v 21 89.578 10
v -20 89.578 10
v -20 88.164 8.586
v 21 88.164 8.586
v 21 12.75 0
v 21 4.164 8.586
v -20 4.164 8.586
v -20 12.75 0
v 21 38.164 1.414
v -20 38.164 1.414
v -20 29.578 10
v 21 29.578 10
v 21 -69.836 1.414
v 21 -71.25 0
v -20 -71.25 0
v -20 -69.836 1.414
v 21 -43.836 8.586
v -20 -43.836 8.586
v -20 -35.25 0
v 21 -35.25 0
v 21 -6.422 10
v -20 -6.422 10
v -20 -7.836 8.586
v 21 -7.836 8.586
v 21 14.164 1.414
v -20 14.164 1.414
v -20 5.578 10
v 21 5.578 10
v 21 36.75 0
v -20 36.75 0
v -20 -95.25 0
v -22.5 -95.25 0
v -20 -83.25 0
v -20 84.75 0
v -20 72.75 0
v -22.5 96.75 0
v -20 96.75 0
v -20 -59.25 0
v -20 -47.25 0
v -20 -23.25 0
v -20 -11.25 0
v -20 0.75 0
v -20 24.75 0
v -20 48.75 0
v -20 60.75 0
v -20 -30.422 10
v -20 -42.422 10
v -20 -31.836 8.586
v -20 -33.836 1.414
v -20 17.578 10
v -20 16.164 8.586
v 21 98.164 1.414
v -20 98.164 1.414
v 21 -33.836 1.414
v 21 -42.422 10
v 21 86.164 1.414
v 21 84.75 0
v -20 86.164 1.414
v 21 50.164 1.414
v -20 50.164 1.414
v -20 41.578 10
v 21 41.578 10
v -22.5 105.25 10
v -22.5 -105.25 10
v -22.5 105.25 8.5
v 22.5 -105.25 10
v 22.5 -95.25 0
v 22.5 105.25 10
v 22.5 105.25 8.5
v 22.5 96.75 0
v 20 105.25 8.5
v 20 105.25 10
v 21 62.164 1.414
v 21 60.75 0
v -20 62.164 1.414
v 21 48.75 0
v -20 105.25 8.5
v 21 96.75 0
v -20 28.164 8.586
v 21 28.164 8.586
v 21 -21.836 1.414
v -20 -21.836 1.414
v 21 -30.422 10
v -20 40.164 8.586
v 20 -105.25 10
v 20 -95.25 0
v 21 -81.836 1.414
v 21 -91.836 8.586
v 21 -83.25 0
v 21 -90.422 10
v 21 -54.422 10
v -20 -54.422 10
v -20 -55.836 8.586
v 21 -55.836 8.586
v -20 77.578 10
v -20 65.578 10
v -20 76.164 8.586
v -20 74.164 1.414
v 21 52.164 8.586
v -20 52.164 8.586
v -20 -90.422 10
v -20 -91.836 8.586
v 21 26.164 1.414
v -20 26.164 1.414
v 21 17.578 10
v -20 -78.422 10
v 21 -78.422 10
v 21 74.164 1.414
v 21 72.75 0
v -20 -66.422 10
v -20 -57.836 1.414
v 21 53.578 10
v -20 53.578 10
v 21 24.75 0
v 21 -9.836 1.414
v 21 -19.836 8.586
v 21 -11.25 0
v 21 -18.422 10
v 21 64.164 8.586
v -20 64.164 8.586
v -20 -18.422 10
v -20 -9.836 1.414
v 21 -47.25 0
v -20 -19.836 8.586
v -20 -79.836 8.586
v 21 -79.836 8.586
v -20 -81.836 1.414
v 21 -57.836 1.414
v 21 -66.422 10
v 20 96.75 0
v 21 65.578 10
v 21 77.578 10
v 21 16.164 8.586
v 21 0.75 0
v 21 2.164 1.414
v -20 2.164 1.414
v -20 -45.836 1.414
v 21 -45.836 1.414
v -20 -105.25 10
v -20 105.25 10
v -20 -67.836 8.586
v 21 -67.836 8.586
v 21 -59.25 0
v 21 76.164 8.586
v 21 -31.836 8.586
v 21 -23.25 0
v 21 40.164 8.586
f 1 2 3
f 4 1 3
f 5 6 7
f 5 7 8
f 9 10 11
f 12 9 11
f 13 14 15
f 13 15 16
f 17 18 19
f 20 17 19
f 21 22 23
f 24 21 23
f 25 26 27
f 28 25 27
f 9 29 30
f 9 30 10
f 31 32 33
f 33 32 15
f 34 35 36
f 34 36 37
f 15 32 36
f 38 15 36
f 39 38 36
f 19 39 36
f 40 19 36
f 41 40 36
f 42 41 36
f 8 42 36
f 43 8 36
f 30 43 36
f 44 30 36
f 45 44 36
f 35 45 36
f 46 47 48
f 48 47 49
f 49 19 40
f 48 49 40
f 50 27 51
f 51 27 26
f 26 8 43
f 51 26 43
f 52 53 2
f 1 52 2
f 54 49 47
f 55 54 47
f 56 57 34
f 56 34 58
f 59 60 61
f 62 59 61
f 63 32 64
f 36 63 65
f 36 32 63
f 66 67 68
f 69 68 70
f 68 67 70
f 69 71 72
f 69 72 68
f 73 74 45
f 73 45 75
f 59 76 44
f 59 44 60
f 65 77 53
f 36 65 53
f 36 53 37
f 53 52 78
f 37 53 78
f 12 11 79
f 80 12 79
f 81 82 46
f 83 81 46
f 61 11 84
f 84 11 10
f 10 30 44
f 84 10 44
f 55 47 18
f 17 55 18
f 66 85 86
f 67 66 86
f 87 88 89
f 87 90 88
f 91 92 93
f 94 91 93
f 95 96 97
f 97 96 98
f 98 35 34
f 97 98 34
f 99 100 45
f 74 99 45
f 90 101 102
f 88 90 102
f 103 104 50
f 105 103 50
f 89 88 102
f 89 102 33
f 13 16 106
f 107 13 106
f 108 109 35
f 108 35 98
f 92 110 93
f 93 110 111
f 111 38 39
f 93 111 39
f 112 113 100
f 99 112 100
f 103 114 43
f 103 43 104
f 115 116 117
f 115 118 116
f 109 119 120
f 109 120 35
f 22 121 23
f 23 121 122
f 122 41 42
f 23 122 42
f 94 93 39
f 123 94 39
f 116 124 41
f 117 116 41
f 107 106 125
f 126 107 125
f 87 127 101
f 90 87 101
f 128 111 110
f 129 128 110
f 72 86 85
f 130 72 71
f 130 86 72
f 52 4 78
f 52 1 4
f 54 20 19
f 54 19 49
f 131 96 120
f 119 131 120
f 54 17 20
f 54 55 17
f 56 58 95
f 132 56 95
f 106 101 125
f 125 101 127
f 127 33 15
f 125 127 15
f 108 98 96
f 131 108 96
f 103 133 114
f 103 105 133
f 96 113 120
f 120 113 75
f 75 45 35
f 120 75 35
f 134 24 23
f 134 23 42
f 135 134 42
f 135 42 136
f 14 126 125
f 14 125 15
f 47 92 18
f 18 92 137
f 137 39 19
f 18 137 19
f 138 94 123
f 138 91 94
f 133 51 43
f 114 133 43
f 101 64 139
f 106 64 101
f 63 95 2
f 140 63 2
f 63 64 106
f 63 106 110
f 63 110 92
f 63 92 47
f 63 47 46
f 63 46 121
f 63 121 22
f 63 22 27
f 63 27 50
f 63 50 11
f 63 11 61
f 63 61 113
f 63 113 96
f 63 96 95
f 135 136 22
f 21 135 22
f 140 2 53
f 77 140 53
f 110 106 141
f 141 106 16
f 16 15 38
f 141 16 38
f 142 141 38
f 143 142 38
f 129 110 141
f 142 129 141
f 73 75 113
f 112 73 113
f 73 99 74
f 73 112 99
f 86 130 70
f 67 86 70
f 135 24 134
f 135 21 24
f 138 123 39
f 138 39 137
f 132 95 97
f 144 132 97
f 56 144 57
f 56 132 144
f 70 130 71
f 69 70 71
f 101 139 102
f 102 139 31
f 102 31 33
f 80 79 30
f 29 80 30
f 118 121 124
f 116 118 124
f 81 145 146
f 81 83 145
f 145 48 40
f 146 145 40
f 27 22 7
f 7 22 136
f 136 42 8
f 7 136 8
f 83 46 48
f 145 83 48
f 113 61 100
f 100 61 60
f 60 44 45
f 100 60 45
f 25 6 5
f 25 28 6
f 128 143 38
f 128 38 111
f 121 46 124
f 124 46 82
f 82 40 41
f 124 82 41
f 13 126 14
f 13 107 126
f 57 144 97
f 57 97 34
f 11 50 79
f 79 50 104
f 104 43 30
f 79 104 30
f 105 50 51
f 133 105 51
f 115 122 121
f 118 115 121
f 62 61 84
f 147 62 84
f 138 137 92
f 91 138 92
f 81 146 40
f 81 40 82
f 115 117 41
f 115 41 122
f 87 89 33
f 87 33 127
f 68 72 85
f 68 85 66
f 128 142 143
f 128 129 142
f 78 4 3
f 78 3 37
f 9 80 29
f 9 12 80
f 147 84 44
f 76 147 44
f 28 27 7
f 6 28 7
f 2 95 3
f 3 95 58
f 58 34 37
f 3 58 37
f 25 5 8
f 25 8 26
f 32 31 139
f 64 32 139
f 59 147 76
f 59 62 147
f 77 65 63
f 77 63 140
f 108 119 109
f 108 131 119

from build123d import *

# Parameters (mm, degrees)
F0_W     = 2.5
F0_H     = 210.5
F1_DEPTH = 10
F3_DEPTH = 41
F4_DEPTH = 3
F6_DEPTH = 4


with BuildPart() as f1:
    # F0 (on Top) → F1 (new body)
    with BuildSketch(Plane.XY):
        with Locations((-21.25, 0)):
            Rectangle(F0_W, F0_H)
    extrude(amount=F1_DEPTH)

    # F2 (on face) → F3 (join)
    with BuildSketch(Plane.YZ.offset(-20)):
        Polygon((-91.8357864376, 8.5857864376), (-83.25, 0), (-81.8357864376, 1.4142135624), (-90.4215728753, 10), align=None)
        Polygon((-79.8357864376, 8.5857864376), (-71.25, 0), (-69.8357864376, 1.4142135624), (-78.4215728753, 10), align=None)
        Polygon((-67.8357864376, 8.5857864376), (-59.25, 0), (-57.8357864376, 1.4142135624), (-66.4215728753, 10), align=None)
        Polygon((-55.8357864376, 8.5857864376), (-47.25, 0), (-45.8357864376, 1.4142135624), (-54.4215728753, 10), align=None)
        Polygon((-43.8357864376, 8.5857864376), (-35.25, 0), (-33.8357864376, 1.4142135624), (-42.4215728753, 10), align=None)
        Polygon((-31.8357864376, 8.5857864376), (-23.25, 0), (-21.8357864376, 1.4142135624), (-30.4215728753, 10), align=None)
        Polygon((-19.8357864376, 8.5857864376), (-11.25, 0), (-9.8357864376, 1.4142135624), (-18.4215728753, 10), align=None)
        Polygon((-7.8357864376, 8.5857864376), (0.75, 0), (2.1642135624, 1.4142135624), (-6.4215728753, 10), align=None)
        Polygon((4.1642135624, 8.5857864376), (12.75, 0), (14.1642135624, 1.4142135624), (5.5784271247, 10), align=None)
        Polygon((16.1642135624, 8.5857864376), (24.75, 0), (26.1642135624, 1.4142135624), (17.5784271247, 10), align=None)
        Polygon((28.1642135624, 8.5857864376), (36.75, 0), (38.1642135624, 1.4142135624), (29.5784271247, 10), align=None)
        Polygon((40.1642135624, 8.5857864376), (48.75, 0), (50.1642135624, 1.4142135624), (41.5784271247, 10), align=None)
        Polygon((52.1642135624, 8.5857864376), (60.75, 0), (62.1642135624, 1.4142135624), (53.5784271247, 10), align=None)
        Polygon((64.1642135624, 8.5857864376), (72.75, 0), (74.1642135624, 1.4142135624), (65.5784271247, 10), align=None)
        Polygon((76.1642135624, 8.5857864376), (84.75, 0), (86.1642135624, 1.4142135624), (77.5784271247, 10), align=None)
        Polygon((88.1642135624, 8.5857864376), (96.75, 0), (98.1642135624, 1.4142135624), (89.5784271247, 10), align=None)
    extrude(amount=F3_DEPTH)

    # F2 (on face) → F4 (cut)
    with BuildSketch(Plane.YZ.offset(-20)):
        Polygon((98.1642135624, 1.4142135624), (96.75, 0), (105.25, 0), (105.25, 8.5), align=None)
        Polygon((-105.25, 10), (-105.25, 0), (-95.25, 0), align=None)
    extrude(amount=-F4_DEPTH, mode=Mode.SUBTRACT)


with BuildPart() as f1b:
    # F0 (on Top) → F1, piece 2 (new body)
    with BuildSketch(Plane.XY):
        with Locations((21.25, 0)):
            Rectangle(F0_W, F0_H)
    extrude(amount=F1_DEPTH)

    # F5 (on face) → F6 (cut)
    with BuildSketch(Plane(origin=(20, 0, 0), x_dir=(0, -1, 0), z_dir=(-1, 0, 0))):
        Polygon((105.25, 10), (95.25, 0), (105.25, 0), align=None)
        Polygon((-96.75, 0), (-105.25, 8.5), (-105.25, 0), align=None)
    extrude(amount=-F6_DEPTH, mode=Mode.SUBTRACT)


solid = Compound([f1.part, f1b.part])
